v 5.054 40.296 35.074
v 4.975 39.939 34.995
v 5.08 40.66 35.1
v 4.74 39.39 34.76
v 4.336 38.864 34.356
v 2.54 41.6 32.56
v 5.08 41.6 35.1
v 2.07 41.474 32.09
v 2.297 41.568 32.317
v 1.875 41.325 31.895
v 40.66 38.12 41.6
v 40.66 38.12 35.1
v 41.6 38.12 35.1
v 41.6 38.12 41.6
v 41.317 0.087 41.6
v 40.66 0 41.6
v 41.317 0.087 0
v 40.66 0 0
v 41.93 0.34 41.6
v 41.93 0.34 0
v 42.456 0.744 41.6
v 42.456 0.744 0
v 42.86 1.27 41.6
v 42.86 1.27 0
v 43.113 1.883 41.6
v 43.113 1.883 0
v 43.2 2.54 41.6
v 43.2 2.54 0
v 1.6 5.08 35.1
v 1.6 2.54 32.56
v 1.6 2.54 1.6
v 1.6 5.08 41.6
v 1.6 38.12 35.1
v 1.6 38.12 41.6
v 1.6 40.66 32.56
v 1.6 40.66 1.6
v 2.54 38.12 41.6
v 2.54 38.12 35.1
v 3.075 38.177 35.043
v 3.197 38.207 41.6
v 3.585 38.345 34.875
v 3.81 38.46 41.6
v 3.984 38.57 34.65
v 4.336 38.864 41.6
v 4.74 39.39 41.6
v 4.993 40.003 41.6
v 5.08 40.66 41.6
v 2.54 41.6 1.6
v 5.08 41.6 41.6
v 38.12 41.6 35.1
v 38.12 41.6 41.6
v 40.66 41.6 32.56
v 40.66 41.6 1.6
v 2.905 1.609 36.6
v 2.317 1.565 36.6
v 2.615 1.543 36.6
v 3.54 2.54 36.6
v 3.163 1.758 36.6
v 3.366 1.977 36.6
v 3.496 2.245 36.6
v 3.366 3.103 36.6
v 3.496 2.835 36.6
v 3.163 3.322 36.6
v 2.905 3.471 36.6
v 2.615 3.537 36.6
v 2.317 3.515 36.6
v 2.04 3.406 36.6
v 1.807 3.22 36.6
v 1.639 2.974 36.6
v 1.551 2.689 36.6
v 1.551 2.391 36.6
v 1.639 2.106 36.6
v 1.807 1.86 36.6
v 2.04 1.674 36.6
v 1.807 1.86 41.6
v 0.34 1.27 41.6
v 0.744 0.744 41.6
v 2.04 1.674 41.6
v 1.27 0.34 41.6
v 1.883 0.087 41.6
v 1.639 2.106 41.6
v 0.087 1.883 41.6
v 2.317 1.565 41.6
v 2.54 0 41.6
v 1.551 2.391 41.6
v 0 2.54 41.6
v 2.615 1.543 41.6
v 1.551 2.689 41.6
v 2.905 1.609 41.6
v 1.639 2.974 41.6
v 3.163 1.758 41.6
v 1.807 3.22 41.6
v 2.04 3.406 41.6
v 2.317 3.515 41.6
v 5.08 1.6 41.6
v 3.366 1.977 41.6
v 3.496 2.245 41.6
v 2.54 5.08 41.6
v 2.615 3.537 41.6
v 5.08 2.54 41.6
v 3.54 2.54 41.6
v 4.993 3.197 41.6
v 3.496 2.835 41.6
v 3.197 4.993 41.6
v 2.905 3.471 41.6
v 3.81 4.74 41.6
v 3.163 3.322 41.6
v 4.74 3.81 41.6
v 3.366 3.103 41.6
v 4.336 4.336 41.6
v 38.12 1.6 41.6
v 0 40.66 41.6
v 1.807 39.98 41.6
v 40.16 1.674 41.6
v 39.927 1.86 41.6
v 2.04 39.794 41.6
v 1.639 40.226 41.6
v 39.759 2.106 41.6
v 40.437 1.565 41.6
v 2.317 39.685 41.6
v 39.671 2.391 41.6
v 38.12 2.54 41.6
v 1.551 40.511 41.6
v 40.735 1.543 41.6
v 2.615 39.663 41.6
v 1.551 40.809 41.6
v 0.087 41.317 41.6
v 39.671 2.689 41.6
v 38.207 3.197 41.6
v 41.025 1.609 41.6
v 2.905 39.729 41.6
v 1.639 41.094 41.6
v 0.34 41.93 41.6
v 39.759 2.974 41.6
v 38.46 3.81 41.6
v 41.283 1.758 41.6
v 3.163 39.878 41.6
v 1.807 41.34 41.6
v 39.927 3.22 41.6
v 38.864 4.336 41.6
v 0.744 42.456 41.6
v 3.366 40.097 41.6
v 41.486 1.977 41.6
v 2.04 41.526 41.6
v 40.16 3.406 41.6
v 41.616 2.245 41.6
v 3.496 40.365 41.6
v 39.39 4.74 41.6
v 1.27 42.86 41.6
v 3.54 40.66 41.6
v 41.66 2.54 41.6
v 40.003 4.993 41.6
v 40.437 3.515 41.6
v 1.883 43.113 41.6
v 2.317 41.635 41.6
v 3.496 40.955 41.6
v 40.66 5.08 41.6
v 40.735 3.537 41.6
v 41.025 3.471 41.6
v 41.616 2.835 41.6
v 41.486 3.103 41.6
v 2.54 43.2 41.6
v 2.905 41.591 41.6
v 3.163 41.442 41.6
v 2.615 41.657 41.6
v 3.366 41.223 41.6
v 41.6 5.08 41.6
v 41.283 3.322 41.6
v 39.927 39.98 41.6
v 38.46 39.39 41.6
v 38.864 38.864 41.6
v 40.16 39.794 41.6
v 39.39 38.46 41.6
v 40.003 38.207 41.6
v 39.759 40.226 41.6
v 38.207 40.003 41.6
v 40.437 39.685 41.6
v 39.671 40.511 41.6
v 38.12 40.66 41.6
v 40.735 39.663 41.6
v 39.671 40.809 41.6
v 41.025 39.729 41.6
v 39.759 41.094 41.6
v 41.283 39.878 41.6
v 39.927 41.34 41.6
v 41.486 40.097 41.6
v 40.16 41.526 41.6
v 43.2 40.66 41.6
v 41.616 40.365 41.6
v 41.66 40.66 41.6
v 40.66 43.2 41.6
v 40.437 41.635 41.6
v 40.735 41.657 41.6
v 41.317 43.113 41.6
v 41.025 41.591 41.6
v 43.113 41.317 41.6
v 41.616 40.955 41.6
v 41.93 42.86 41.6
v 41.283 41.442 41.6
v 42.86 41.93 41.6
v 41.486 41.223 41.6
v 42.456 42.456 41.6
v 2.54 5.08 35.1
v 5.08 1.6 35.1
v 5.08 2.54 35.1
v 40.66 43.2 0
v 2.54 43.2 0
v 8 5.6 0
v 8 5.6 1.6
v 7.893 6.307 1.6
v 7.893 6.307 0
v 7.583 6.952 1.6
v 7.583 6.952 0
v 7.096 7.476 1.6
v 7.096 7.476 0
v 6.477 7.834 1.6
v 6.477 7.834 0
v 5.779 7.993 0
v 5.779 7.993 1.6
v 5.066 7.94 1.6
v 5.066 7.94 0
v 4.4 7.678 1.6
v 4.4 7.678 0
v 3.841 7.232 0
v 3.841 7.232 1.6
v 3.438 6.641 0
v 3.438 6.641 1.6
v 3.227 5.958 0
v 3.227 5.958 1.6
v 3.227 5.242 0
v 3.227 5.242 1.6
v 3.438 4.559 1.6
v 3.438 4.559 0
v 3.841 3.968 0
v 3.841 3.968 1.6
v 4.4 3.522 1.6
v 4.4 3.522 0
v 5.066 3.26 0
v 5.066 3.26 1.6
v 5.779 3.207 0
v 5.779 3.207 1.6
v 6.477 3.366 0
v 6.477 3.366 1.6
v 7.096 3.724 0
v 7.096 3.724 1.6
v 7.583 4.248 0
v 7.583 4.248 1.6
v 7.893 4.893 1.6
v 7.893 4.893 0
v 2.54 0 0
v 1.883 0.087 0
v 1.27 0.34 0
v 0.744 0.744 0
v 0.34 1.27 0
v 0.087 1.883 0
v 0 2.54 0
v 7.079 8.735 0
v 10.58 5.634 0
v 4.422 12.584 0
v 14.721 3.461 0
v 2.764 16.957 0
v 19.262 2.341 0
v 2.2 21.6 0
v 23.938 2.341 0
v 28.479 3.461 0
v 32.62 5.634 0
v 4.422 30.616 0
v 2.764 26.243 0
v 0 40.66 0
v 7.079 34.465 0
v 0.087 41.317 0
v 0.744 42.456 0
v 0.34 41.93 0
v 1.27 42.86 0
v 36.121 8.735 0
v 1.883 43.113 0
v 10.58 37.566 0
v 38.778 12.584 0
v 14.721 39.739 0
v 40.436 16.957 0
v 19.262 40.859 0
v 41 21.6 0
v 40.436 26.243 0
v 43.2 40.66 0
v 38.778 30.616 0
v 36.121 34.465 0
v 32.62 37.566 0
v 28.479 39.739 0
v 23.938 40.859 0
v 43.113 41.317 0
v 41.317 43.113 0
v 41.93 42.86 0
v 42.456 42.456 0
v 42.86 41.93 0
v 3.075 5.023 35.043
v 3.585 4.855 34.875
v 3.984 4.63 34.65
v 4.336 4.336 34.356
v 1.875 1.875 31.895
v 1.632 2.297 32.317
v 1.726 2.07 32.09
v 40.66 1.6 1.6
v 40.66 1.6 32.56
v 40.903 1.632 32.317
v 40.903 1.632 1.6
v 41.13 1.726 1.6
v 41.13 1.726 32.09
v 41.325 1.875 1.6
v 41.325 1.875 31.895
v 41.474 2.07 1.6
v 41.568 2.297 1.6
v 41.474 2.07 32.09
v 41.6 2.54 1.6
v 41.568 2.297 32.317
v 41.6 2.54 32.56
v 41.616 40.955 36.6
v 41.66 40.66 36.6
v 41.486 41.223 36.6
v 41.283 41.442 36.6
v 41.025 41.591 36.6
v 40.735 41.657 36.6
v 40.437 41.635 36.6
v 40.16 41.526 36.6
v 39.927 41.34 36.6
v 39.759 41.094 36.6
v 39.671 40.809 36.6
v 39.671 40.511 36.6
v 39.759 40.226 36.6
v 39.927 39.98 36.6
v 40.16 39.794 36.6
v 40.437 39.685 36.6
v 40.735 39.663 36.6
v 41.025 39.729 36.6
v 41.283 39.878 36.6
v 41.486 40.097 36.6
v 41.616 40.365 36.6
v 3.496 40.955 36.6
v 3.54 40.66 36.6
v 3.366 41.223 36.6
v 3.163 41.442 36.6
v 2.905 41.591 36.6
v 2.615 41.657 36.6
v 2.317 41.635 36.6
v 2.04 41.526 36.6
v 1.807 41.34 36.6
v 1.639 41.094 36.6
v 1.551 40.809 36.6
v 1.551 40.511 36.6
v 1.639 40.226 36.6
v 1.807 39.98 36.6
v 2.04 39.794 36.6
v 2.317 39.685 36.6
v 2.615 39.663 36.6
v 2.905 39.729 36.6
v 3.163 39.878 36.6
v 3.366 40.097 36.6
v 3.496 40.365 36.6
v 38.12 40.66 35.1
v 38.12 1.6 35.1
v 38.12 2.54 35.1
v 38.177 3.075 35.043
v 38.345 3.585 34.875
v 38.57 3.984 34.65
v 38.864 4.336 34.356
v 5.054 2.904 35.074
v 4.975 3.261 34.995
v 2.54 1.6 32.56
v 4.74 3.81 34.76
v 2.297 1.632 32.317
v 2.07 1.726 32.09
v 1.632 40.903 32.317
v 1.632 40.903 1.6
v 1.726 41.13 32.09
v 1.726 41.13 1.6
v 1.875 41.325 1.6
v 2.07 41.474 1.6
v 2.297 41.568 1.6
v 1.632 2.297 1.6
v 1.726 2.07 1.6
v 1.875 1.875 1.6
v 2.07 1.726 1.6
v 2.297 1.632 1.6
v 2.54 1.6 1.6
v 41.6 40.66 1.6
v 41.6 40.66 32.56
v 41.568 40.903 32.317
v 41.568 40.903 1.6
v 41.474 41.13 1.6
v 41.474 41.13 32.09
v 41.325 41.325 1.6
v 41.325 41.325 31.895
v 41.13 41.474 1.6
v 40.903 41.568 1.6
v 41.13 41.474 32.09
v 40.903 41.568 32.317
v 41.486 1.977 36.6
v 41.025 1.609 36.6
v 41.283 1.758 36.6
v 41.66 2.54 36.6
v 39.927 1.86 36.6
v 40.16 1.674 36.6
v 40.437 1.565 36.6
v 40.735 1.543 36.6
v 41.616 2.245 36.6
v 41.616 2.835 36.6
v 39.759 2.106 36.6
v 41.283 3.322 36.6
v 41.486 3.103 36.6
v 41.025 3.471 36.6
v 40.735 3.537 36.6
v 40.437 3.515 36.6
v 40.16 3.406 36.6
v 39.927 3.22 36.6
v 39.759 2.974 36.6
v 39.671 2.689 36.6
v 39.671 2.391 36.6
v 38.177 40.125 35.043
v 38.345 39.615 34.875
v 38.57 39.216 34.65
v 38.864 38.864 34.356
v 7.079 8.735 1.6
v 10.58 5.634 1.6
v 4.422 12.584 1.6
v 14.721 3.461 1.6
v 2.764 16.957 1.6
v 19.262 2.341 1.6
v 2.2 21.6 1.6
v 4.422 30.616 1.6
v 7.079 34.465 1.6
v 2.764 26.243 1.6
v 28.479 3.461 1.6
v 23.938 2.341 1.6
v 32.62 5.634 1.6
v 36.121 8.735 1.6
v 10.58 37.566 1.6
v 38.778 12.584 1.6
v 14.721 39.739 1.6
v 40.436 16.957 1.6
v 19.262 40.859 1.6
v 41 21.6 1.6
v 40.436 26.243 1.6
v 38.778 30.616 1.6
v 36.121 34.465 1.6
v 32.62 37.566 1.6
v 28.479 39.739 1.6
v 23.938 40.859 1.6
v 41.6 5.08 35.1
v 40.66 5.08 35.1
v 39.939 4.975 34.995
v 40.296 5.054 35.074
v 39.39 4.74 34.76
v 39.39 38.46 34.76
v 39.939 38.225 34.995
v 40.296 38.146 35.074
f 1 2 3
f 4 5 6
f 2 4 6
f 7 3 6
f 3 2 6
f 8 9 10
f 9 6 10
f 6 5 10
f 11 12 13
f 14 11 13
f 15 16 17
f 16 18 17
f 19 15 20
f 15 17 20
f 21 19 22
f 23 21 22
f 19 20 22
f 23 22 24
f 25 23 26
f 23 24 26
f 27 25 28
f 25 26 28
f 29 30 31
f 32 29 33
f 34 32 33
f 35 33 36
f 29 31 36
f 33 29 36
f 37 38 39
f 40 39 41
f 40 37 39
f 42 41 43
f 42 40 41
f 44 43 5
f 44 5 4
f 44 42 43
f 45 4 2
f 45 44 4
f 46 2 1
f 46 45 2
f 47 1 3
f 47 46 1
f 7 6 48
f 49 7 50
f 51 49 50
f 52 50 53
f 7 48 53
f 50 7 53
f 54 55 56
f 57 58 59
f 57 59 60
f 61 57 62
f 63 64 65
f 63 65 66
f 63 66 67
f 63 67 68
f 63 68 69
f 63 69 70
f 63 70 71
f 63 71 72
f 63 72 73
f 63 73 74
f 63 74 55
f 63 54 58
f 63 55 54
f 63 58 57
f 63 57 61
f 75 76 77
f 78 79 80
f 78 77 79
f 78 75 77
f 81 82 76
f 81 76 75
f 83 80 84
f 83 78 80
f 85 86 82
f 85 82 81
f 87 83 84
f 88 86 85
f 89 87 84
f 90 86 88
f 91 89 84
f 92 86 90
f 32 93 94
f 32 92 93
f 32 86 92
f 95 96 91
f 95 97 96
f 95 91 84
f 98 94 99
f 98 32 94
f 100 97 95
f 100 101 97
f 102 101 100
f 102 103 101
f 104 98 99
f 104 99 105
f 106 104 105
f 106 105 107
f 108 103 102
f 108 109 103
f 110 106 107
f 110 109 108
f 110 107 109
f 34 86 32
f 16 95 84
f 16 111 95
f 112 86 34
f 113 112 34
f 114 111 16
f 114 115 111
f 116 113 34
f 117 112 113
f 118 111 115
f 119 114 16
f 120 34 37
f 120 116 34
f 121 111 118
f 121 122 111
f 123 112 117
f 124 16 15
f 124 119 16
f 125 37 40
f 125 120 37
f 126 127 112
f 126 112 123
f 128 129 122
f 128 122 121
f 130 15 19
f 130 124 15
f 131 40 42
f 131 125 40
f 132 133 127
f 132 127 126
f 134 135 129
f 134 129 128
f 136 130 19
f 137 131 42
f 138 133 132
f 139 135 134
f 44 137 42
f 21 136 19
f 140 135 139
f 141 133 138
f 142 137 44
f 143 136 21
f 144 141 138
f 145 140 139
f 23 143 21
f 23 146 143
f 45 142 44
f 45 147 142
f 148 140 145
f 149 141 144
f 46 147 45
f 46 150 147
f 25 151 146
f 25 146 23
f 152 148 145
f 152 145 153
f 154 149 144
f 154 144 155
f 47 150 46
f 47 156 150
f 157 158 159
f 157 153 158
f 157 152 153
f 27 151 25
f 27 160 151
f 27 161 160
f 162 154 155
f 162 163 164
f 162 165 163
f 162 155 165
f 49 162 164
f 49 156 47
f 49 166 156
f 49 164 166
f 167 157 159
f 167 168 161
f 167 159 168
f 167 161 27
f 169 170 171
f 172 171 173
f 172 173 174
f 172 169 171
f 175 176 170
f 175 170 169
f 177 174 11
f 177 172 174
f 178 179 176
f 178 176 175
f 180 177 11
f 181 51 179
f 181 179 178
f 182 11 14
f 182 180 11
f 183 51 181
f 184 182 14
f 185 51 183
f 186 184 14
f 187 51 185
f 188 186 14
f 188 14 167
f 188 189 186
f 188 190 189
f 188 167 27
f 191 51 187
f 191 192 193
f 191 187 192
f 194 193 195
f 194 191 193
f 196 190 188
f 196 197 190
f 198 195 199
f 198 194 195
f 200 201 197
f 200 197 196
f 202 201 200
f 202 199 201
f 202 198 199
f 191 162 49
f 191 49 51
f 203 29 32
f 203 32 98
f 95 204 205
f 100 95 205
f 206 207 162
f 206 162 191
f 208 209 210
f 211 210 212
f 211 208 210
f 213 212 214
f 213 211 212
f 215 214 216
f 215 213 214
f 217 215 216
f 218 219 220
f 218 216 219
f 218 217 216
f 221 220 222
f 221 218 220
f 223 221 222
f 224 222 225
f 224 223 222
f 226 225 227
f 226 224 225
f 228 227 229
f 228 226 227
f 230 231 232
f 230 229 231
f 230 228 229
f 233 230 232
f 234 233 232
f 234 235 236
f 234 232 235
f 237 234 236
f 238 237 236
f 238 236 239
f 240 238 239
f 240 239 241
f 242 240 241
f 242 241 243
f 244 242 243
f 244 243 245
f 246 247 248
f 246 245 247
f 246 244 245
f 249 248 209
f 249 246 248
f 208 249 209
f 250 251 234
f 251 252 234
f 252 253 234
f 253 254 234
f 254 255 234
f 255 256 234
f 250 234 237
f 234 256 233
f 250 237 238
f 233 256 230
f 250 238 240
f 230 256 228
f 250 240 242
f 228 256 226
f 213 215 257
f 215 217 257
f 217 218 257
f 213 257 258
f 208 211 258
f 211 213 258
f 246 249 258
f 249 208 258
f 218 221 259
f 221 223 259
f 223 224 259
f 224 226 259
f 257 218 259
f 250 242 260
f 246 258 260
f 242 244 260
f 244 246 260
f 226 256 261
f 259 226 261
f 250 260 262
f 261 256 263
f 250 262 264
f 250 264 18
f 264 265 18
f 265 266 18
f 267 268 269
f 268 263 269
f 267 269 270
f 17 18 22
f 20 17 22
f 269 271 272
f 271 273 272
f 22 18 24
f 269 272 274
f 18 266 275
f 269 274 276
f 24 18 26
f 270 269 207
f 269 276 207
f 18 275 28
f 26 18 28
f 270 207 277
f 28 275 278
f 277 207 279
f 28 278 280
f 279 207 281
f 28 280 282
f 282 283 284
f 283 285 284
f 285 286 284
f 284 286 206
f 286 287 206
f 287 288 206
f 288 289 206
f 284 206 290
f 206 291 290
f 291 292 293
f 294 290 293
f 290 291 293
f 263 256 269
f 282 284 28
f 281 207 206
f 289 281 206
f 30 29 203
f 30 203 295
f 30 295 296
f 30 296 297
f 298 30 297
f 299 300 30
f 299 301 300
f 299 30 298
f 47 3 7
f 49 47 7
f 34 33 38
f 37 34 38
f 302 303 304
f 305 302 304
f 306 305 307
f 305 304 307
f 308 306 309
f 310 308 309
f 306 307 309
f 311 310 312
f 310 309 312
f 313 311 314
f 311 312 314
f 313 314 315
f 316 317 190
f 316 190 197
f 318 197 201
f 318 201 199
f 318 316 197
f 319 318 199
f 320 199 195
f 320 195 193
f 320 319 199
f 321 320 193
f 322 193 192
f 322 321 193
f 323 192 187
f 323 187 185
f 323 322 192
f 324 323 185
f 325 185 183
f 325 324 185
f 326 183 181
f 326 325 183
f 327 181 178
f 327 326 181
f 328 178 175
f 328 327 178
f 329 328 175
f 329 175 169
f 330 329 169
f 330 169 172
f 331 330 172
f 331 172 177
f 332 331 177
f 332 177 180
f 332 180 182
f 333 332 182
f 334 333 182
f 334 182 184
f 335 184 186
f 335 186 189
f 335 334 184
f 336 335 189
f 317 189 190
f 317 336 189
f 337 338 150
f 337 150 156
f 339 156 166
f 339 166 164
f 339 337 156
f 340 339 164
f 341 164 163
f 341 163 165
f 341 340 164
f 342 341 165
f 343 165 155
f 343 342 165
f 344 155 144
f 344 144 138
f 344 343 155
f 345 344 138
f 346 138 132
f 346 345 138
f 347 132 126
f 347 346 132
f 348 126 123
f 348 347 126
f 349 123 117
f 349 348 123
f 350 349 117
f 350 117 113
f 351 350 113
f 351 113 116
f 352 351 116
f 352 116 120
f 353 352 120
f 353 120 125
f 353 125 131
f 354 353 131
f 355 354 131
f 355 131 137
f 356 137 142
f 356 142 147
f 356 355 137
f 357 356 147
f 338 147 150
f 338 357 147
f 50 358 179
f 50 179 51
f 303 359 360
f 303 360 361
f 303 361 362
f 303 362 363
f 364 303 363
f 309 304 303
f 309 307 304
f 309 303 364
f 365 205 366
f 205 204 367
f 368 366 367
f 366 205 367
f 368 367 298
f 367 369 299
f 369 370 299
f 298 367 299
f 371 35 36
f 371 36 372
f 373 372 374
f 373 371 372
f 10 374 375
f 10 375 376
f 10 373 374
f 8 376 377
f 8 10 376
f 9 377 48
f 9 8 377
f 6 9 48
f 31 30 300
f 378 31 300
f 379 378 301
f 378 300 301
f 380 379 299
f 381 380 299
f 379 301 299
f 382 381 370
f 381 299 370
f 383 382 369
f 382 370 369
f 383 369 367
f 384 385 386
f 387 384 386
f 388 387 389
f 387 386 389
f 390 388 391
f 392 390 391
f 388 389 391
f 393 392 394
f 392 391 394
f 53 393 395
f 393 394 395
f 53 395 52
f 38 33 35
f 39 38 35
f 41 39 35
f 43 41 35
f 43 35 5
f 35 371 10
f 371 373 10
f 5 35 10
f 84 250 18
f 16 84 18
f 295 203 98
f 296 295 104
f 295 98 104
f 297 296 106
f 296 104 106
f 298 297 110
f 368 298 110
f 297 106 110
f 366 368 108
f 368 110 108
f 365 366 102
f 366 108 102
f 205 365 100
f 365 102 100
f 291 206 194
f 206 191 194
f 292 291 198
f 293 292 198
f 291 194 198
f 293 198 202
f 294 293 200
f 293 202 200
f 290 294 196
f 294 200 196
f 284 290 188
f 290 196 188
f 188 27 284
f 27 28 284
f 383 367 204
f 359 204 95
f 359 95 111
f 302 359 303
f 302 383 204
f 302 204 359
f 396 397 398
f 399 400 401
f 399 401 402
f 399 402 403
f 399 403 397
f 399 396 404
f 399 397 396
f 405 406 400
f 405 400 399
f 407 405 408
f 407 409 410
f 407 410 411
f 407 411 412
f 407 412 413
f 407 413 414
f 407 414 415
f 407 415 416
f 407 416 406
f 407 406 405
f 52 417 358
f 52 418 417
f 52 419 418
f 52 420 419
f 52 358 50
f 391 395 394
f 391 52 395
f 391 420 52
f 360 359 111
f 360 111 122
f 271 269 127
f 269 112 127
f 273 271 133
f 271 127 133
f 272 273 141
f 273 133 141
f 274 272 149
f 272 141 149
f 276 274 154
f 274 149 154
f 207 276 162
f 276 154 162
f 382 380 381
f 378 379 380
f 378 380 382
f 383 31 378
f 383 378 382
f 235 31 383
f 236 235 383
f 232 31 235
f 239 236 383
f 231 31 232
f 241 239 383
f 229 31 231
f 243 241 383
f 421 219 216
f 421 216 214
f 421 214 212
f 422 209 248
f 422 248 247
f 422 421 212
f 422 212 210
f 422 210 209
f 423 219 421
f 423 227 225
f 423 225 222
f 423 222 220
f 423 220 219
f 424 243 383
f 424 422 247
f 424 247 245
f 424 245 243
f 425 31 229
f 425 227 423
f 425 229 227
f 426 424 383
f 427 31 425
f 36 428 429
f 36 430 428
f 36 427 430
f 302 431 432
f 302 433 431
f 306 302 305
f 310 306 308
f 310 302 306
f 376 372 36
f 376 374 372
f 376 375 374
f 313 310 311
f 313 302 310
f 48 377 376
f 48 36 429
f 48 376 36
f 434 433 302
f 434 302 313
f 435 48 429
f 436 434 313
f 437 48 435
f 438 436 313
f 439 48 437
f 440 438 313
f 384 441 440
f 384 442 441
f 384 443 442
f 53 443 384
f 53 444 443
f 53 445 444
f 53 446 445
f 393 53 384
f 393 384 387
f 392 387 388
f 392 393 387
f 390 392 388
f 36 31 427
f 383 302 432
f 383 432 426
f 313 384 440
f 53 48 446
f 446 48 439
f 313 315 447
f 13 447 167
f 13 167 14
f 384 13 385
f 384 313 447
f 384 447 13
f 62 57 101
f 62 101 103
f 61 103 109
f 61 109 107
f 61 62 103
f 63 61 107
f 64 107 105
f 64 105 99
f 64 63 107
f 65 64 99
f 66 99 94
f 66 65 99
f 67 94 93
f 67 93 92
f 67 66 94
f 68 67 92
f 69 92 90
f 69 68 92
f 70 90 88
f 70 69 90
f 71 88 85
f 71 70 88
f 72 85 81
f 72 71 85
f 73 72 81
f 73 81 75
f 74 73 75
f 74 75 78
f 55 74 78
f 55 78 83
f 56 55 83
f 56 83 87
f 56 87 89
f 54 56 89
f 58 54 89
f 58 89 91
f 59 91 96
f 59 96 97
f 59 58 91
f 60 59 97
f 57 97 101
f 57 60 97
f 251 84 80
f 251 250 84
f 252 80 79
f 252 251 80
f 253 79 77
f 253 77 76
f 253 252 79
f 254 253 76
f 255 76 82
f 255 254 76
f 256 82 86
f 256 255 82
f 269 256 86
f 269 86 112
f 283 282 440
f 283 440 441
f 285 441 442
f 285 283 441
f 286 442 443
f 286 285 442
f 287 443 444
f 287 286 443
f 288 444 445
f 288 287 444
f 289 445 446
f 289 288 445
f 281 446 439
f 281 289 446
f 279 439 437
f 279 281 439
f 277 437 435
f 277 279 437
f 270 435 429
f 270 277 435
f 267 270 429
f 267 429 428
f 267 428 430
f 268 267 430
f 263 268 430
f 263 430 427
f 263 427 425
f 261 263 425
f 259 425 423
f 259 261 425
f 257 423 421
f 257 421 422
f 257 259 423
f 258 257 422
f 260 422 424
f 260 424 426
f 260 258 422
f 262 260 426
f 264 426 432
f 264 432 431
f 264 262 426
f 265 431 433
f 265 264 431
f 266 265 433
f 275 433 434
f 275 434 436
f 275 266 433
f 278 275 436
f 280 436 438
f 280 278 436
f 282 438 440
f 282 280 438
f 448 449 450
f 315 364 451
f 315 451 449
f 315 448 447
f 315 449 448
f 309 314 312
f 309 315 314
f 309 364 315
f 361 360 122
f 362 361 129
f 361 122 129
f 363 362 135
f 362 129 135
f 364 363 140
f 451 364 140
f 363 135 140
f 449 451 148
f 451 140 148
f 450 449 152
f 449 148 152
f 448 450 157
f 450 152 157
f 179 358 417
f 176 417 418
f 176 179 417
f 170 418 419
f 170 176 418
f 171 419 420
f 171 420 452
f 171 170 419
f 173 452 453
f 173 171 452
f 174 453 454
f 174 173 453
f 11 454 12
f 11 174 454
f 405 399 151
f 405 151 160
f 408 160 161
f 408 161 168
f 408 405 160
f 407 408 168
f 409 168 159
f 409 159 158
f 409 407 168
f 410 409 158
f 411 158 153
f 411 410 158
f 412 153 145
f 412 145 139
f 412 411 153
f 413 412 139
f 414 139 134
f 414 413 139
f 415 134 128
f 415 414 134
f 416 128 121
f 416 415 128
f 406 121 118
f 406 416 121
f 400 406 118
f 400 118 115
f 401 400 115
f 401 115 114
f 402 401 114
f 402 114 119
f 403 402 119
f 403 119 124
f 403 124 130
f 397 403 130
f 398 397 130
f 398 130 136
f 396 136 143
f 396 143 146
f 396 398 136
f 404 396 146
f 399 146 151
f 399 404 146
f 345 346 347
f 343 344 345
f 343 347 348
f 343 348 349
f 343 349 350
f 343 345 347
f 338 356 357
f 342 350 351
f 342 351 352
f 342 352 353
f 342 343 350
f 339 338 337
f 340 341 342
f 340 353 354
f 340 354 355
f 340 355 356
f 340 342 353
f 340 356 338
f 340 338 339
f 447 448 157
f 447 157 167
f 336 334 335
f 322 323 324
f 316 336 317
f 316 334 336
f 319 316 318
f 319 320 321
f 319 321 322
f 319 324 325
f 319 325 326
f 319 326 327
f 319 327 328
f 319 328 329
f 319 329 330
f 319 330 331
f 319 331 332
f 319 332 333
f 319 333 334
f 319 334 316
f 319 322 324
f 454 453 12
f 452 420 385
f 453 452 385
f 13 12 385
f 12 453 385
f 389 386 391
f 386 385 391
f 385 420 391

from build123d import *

# Parameters (mm, degrees)
CYLINDER001_R     = 2.4
CYLINDER001_DEPTH = 10
CYLINDER004_R     = 1
CYLINDER004_DEPTH = 5
CYLINDER005_R     = 1
CYLINDER005_DEPTH = 5
CYLINDER003_R     = 1
CYLINDER003_DEPTH = 5
CYLINDER002_R     = 1
CYLINDER002_DEPTH = 5
CYLINDER_R        = 19.4
CYLINDER_DEPTH    = 1.6
BOX004_W          = 5.08
BOX004_H          = 5.08
BOX004_DEPTH      = 10
CHAMFER_SIZE      = 3.5
FILLET002_R       = 2.54
BOX005_W          = 5.08
BOX005_H          = 5.08
BOX005_DEPTH      = 10
CHAMFER001_SIZE   = 3.5
FILLET003_R       = 2.54
BOX003_W          = 5.08
BOX003_H          = 5.08
BOX003_DEPTH      = 10
CHAMFER002_SIZE   = 3.5
FILLET004_R       = 2.54
BOX002_W          = 5.08
BOX002_H          = 5.08
BOX002_DEPTH      = 10
CHAMFER003_SIZE   = 3.5
FILLET001_R       = 2.54
BOX001_W          = 40
BOX001_H          = 40
BOX001_DEPTH      = 41.6
BOX_W             = 43.2
BOX_H             = 43.2
BOX_DEPTH         = 41.6
FILLET_R          = 0.94
FILLET005_R       = 2.54


with BuildPart() as ir:
    # Cylinder001 → Cylinder001 (new body)
    with BuildSketch(Plane(origin=(5.6, 5.6, 0), x_dir=(1, 0, 0), z_dir=(0, 0, 1))):
        Circle(CYLINDER001_R)
    extrude(amount=CYLINDER001_DEPTH)


with BuildPart() as zylinder002:
    # Cylinder004 → Cylinder004 (new body)
    with BuildSketch(Plane(origin=(2.54, 40.66, 36.6), x_dir=(1, 0, 0), z_dir=(0, 0, 1))):
        Circle(CYLINDER004_R)
    extrude(amount=CYLINDER004_DEPTH)


with BuildPart() as zylinder003:
    # Cylinder005 → Cylinder005 (new body)
    with BuildSketch(Plane(origin=(40.66, 40.66, 36.6), x_dir=(1, 0, 0), z_dir=(0, 0, 1))):
        Circle(CYLINDER005_R)
    extrude(amount=CYLINDER005_DEPTH)


with BuildPart() as zylinder001:
    # Cylinder003 → Cylinder003 (new body)
    with BuildSketch(Plane(origin=(40.66, 2.54, 36.6), x_dir=(1, 0, 0), z_dir=(0, 0, 1))):
        Circle(CYLINDER003_R)
    extrude(amount=CYLINDER003_DEPTH)


with BuildPart() as screws:
    # Cylinder002 → Cylinder002 (new body)
    with BuildSketch(Plane(origin=(2.54, 2.54, 36.6), x_dir=(1, 0, 0), z_dir=(0, 0, 1))):
        Circle(CYLINDER002_R)
    extrude(amount=CYLINDER002_DEPTH)

    # Fusion002: union Zylinder002, Zylinder003, Zylinder001
    add(zylinder002.part)
    add(zylinder003.part)
    add(zylinder001.part)


with BuildPart() as speaker:
    # Cylinder → Cylinder (new body)
    with BuildSketch(Plane(origin=(21.6, 21.6, 0), x_dir=(1, 0, 0), z_dir=(0, 0, 1))):
        Circle(CYLINDER_R)
    extrude(amount=CYLINDER_DEPTH)


with BuildPart() as fillet002:
    # Box004 → Box004 (new body)
    with BuildSketch(Plane(origin=(0, 38.12, 31.6), x_dir=(1, 0, 0), z_dir=(0, 0, 1))):
        with Locations((2.54, 2.54)):
            Rectangle(BOX004_W, BOX004_H)
    extrude(amount=BOX004_DEPTH)

    # Chamfer
    chamfer_edges = [fillet002.edges().sort_by_distance(p)[0] for p in [
        (5.08, 40.66, 31.6),
        (2.54, 38.12, 31.6),
    ]]
    chamfer(chamfer_edges, length=CHAMFER_SIZE)

    # Fillet002
    fillet002_edges = [fillet002.edges().sort_by_distance(p)[0] for p in [
        (5.08, 38.12, 38.35),
    ]]
    fillet(fillet002_edges, radius=FILLET002_R)


with BuildPart() as fillet003:
    # Box005 → Box005 (new body)
    with BuildSketch(Plane(origin=(38.12, 38.12, 31.6), x_dir=(1, 0, 0), z_dir=(0, 0, 1))):
        with Locations((2.54, 2.54)):
            Rectangle(BOX005_W, BOX005_H)
    extrude(amount=BOX005_DEPTH)

    # Chamfer001
    chamfer001_edges = [fillet003.edges().sort_by_distance(p)[0] for p in [
        (38.12, 40.66, 31.6),
        (40.66, 38.12, 31.6),
    ]]
    chamfer(chamfer001_edges, length=CHAMFER001_SIZE)

    # Fillet003
    fillet003_edges = [fillet003.edges().sort_by_distance(p)[0] for p in [
        (38.12, 38.12, 38.35),
    ]]
    fillet(fillet003_edges, radius=FILLET003_R)


with BuildPart() as fillet004:
    # Box003 → Box003 (new body)
    with BuildSketch(Plane(origin=(38.12, 0, 31.6), x_dir=(1, 0, 0), z_dir=(0, 0, 1))):
        with Locations((2.54, 2.54)):
            Rectangle(BOX003_W, BOX003_H)
    extrude(amount=BOX003_DEPTH)

    # Chamfer002
    chamfer002_edges = [fillet004.edges().sort_by_distance(p)[0] for p in [
        (38.12, 2.54, 31.6),
        (40.66, 5.08, 31.6),
    ]]
    chamfer(chamfer002_edges, length=CHAMFER002_SIZE)

    # Fillet004
    fillet004_edges = [fillet004.edges().sort_by_distance(p)[0] for p in [
        (38.12, 5.08, 38.35),
    ]]
    fillet(fillet004_edges, radius=FILLET004_R)


with BuildPart() as holder:
    # Box002 → Box002 (new body)
    with BuildSketch(Plane.XY.offset(31.6)):
        with Locations((2.54, 2.54)):
            Rectangle(BOX002_W, BOX002_H)
    extrude(amount=BOX002_DEPTH)

    # Chamfer003
    chamfer003_edges = [holder.edges().sort_by_distance(p)[0] for p in [
        (5.08, 2.54, 31.6),
        (2.54, 5.08, 31.6),
    ]]
    chamfer(chamfer003_edges, length=CHAMFER003_SIZE)

    # Fillet001
    fillet001_edges = [holder.edges().sort_by_distance(p)[0] for p in [
        (5.08, 5.08, 38.35),
    ]]
    fillet(fillet001_edges, radius=FILLET001_R)

    # Fusion: union Fillet002, Fillet003, Fillet004
    add(fillet002.part)
    add(fillet003.part)
    add(fillet004.part)


with BuildPart() as w_rfel001:
    # Box001 → Box001 (new body)
    with BuildSketch(Plane(origin=(1.6, 1.6, 1.6), x_dir=(1, 0, 0), z_dir=(0, 0, 1))):
        with Locations((20, 20)):
            Rectangle(BOX001_W, BOX001_H)
    extrude(amount=BOX001_DEPTH)


with BuildPart() as cut003:
    # Box → Box (new body)
    with BuildSketch(Plane.XY):
        with Locations((21.6, 21.6)):
            Rectangle(BOX_W, BOX_H)
    extrude(amount=BOX_DEPTH)

    # Cut: cut Würfel001
    add(w_rfel001.part, mode=Mode.SUBTRACT)

    # Fillet
    fillet_edges = [cut003.edges().sort_by_distance(p)[0] for p in [
        (41.6, 1.6, 21.6),
        (41.6, 41.6, 21.6),
        (1.6, 41.6, 21.6),
        (1.6, 1.6, 21.6),
    ]]
    fillet(fillet_edges, radius=FILLET_R)

    # Fusion001: union Holder
    add(holder.part)

    # Fillet005
    fillet005_edges = [cut003.edges().sort_by_distance(p)[0] for p in [
        (0, 0, 15.8),
        (0, 43.2, 15.8),
        (43.2, 43.2, 15.8),
        (43.2, 0, 15.8),
        (0, 0, 36.6),
        (0, 43.2, 36.6),
        (43.2, 43.2, 36.6),
        (43.2, 0, 36.6),
    ]]
    fillet(fillet005_edges, radius=FILLET005_R)

    # Cut001: cut Speaker
    add(speaker.part, mode=Mode.SUBTRACT)

    # Cut002: cut Screws
    add(screws.part, mode=Mode.SUBTRACT)

    # Cut003: cut IR
    add(ir.part, mode=Mode.SUBTRACT)


solid = cut003.part
